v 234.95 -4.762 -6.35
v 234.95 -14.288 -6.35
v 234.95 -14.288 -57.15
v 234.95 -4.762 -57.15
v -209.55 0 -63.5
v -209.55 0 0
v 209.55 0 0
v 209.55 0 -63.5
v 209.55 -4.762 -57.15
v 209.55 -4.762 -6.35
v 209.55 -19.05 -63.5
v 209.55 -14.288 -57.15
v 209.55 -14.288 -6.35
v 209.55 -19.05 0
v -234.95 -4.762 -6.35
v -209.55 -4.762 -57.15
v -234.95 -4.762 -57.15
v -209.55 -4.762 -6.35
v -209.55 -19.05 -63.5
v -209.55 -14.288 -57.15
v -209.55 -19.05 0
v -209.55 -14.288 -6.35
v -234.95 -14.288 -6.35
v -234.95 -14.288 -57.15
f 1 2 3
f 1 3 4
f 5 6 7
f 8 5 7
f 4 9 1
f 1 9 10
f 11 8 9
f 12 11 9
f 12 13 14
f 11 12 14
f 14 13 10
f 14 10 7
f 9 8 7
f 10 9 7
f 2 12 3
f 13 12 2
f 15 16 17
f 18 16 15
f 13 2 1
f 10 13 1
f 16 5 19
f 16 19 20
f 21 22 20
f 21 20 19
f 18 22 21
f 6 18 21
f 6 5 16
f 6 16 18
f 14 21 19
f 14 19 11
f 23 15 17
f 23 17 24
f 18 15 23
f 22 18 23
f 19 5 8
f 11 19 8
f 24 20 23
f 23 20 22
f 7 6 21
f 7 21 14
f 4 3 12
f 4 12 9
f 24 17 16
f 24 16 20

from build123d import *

# Parameters (mm, degrees)
F0_W     = 419.1
F0_H     = 63.5
F1_DEPTH = 19.05
F2_W     = 9.525
F2_H     = 50.8
F3_DEPTH = 25.4
F4_W     = 9.525
F4_H     = 50.8
F5_DEPTH = 25.4


with BuildPart() as f1:
    # F0 (on Front) → F1 (new body)
    with BuildSketch(Plane.XZ):
        with Locations((0, -31.75)):
            Rectangle(F0_W, F0_H)
    extrude(amount=F1_DEPTH)

    # F2 (on face) → F3 (join)
    with BuildSketch(Plane.YZ.offset(209.55)):
        with Locations((-9.525, -31.75)):
            Rectangle(F2_W, F2_H)
    extrude(amount=F3_DEPTH)

    # F4 (on face) → F5 (join)
    with BuildSketch(Plane(origin=(-209.55, 0, 0), x_dir=(0, -1, 0), z_dir=(-1, 0, 0))):
        with Locations((9.525, -31.75)):
            Rectangle(F4_W, F4_H)
    extrude(amount=F5_DEPTH)


solid = f1.part
